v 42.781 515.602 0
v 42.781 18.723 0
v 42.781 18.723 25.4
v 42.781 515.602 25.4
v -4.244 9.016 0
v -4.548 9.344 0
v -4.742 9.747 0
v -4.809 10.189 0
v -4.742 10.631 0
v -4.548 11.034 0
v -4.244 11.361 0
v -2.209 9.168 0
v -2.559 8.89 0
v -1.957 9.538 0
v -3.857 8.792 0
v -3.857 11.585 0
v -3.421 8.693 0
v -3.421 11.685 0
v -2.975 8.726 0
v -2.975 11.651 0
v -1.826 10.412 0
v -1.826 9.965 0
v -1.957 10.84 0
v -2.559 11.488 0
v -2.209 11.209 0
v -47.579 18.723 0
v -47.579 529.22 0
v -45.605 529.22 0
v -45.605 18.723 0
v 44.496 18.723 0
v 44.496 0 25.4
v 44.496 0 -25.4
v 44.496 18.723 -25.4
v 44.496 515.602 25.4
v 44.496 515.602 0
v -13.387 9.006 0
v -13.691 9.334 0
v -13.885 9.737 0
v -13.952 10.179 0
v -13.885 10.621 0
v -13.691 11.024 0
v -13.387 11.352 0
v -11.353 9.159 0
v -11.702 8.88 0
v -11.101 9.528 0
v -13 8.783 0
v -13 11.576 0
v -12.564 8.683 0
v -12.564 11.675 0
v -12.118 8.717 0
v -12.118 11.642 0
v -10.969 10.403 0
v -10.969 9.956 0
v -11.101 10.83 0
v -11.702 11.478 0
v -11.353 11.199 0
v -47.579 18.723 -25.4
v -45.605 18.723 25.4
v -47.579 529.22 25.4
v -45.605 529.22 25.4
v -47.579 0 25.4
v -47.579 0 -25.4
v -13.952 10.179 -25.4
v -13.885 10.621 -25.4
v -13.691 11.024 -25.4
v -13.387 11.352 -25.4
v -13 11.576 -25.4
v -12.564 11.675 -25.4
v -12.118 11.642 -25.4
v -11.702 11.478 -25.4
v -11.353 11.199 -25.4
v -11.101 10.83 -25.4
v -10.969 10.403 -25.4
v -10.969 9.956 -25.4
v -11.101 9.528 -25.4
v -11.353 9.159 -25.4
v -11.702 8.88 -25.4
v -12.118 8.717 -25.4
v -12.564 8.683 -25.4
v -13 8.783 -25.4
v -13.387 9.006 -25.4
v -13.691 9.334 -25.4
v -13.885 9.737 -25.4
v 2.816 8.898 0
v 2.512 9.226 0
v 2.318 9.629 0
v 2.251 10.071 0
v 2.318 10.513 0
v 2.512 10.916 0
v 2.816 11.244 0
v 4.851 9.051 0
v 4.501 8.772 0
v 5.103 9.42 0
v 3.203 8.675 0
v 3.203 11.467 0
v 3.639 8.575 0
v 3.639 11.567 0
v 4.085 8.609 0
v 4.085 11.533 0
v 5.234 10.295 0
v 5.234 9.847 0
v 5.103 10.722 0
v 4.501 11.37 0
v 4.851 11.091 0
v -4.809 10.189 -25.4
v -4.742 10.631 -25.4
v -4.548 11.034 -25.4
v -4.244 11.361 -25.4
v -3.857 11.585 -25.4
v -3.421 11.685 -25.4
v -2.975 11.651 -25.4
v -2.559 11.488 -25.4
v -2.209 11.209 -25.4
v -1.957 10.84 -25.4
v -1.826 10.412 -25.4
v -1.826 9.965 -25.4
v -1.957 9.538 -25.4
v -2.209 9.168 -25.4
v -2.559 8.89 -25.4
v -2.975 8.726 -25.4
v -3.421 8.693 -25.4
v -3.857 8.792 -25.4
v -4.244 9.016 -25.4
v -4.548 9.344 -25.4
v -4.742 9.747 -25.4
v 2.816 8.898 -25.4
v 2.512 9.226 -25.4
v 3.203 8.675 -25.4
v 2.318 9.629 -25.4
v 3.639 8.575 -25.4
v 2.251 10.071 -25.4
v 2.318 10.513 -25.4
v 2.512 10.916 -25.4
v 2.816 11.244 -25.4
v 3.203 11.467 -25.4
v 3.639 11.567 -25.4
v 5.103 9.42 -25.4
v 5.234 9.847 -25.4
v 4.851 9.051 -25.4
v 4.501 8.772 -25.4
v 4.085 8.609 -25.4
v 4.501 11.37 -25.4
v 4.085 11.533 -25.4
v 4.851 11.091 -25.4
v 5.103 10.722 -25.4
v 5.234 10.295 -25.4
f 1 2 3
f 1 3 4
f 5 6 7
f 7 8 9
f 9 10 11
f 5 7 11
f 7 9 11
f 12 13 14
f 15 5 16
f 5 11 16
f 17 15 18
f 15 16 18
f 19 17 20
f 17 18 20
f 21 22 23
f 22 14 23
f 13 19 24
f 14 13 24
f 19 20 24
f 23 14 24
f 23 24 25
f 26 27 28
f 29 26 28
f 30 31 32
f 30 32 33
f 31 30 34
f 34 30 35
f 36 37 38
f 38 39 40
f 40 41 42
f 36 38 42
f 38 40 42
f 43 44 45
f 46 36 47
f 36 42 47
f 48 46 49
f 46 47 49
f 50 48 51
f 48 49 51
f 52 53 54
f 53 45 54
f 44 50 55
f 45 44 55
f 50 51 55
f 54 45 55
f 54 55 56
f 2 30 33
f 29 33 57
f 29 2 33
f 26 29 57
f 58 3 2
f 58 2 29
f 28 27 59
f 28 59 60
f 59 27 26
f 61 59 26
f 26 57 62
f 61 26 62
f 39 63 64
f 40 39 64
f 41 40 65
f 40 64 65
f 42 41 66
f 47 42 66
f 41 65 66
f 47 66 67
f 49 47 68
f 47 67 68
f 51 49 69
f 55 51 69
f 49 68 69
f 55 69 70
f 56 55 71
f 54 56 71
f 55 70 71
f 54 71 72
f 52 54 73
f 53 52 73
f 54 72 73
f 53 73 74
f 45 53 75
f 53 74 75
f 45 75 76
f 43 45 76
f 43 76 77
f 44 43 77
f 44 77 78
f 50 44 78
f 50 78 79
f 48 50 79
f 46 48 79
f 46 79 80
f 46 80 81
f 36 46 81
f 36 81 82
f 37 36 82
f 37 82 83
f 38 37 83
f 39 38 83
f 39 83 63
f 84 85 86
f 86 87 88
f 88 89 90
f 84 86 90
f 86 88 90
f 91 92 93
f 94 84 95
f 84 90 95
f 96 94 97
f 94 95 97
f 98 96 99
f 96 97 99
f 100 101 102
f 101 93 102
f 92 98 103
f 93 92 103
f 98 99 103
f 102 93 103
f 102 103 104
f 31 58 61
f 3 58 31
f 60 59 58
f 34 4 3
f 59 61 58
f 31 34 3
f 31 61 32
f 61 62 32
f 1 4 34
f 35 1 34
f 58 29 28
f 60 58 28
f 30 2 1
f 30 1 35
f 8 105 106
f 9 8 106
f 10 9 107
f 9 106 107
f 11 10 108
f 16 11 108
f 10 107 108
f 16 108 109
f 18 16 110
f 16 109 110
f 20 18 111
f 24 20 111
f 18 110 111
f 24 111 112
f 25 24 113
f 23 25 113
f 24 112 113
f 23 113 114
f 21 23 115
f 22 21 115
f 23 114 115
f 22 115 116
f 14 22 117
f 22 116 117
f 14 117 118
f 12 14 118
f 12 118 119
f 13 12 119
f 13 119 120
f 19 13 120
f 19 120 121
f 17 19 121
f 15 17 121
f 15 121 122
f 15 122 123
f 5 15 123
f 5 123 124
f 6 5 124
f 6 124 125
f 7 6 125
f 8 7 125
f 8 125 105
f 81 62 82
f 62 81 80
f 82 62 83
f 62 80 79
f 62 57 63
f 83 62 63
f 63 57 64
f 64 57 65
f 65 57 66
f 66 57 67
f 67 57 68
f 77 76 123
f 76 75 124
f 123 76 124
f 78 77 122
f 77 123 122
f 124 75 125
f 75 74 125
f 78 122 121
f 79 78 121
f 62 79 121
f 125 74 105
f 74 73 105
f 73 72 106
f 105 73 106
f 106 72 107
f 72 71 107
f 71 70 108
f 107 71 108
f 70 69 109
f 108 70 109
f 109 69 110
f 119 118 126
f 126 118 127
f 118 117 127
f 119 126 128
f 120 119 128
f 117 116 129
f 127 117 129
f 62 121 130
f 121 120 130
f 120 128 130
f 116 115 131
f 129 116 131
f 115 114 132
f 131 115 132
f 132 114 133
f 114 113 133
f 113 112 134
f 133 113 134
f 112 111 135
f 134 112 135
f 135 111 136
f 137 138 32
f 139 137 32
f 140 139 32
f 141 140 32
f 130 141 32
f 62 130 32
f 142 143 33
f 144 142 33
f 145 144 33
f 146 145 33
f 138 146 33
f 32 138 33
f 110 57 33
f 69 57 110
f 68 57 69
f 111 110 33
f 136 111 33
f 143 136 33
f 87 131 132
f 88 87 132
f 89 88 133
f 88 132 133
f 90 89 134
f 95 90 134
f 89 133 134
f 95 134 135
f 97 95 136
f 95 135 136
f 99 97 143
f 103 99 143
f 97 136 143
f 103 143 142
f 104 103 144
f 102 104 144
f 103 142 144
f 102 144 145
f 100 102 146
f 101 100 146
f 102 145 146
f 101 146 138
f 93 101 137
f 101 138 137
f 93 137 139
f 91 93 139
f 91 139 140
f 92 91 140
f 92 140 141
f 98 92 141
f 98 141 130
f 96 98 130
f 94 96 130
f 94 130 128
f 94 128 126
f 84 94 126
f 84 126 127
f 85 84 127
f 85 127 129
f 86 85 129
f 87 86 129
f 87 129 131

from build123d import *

# Parameters (mm, degrees)
F0_W     = 1.9742772416
F0_H     = 18.7233856638
F0_W_2   = 88.3857645094
F0_W_3   = 1.7149582489
F1_DEPTH = 25.4
F3_D     = 3
F0_H_2   = 510.4961821119
F0_H_3   = 496.8783685247
F4_DEPTH = 25.4


with BuildPart() as f1:
    # F0 (on Top) → F1 (new body)
    with BuildSketch(Plane.XY):
        with Locations((-46.5922877409, 9.3616928319)):
            Rectangle(F0_W, F0_H)
        with Locations((-1.4122668654, 9.3616928319)):
            Rectangle(F0_W_2, F0_H)
        with Locations((43.6380945138, 9.3616928319)):
            Rectangle(F0_W_3, F0_H)
    extrude(amount=-F1_DEPTH)

    # F3 (through all)
    with Locations(Plane.XY):
        with Locations((3.7512294251, 10.0710503428), (-3.3089503626, 10.1887194856), (-12.4521386383, 10.1791908965)):
            Hole(F3_D / 2)

    # F0 (on Top) → F4 (join)
    with BuildSketch(Plane.XY):
        with Locations((-46.5922877409, 273.9714767198)):
            Rectangle(F0_W, F0_H_2)
        with Locations((-46.5922877409, 9.3616928319)):
            Rectangle(F0_W, F0_H)
        with Locations((-1.4122668654, 9.3616928319)):
            Rectangle(F0_W_2, F0_H)
        with Locations((43.6380945138, 267.1625699262)):
            Rectangle(F0_W_3, F0_H_3)
        with Locations((43.6380945138, 9.3616928319)):
            Rectangle(F0_W_3, F0_H)
    extrude(amount=F4_DEPTH)


solid = f1.part
